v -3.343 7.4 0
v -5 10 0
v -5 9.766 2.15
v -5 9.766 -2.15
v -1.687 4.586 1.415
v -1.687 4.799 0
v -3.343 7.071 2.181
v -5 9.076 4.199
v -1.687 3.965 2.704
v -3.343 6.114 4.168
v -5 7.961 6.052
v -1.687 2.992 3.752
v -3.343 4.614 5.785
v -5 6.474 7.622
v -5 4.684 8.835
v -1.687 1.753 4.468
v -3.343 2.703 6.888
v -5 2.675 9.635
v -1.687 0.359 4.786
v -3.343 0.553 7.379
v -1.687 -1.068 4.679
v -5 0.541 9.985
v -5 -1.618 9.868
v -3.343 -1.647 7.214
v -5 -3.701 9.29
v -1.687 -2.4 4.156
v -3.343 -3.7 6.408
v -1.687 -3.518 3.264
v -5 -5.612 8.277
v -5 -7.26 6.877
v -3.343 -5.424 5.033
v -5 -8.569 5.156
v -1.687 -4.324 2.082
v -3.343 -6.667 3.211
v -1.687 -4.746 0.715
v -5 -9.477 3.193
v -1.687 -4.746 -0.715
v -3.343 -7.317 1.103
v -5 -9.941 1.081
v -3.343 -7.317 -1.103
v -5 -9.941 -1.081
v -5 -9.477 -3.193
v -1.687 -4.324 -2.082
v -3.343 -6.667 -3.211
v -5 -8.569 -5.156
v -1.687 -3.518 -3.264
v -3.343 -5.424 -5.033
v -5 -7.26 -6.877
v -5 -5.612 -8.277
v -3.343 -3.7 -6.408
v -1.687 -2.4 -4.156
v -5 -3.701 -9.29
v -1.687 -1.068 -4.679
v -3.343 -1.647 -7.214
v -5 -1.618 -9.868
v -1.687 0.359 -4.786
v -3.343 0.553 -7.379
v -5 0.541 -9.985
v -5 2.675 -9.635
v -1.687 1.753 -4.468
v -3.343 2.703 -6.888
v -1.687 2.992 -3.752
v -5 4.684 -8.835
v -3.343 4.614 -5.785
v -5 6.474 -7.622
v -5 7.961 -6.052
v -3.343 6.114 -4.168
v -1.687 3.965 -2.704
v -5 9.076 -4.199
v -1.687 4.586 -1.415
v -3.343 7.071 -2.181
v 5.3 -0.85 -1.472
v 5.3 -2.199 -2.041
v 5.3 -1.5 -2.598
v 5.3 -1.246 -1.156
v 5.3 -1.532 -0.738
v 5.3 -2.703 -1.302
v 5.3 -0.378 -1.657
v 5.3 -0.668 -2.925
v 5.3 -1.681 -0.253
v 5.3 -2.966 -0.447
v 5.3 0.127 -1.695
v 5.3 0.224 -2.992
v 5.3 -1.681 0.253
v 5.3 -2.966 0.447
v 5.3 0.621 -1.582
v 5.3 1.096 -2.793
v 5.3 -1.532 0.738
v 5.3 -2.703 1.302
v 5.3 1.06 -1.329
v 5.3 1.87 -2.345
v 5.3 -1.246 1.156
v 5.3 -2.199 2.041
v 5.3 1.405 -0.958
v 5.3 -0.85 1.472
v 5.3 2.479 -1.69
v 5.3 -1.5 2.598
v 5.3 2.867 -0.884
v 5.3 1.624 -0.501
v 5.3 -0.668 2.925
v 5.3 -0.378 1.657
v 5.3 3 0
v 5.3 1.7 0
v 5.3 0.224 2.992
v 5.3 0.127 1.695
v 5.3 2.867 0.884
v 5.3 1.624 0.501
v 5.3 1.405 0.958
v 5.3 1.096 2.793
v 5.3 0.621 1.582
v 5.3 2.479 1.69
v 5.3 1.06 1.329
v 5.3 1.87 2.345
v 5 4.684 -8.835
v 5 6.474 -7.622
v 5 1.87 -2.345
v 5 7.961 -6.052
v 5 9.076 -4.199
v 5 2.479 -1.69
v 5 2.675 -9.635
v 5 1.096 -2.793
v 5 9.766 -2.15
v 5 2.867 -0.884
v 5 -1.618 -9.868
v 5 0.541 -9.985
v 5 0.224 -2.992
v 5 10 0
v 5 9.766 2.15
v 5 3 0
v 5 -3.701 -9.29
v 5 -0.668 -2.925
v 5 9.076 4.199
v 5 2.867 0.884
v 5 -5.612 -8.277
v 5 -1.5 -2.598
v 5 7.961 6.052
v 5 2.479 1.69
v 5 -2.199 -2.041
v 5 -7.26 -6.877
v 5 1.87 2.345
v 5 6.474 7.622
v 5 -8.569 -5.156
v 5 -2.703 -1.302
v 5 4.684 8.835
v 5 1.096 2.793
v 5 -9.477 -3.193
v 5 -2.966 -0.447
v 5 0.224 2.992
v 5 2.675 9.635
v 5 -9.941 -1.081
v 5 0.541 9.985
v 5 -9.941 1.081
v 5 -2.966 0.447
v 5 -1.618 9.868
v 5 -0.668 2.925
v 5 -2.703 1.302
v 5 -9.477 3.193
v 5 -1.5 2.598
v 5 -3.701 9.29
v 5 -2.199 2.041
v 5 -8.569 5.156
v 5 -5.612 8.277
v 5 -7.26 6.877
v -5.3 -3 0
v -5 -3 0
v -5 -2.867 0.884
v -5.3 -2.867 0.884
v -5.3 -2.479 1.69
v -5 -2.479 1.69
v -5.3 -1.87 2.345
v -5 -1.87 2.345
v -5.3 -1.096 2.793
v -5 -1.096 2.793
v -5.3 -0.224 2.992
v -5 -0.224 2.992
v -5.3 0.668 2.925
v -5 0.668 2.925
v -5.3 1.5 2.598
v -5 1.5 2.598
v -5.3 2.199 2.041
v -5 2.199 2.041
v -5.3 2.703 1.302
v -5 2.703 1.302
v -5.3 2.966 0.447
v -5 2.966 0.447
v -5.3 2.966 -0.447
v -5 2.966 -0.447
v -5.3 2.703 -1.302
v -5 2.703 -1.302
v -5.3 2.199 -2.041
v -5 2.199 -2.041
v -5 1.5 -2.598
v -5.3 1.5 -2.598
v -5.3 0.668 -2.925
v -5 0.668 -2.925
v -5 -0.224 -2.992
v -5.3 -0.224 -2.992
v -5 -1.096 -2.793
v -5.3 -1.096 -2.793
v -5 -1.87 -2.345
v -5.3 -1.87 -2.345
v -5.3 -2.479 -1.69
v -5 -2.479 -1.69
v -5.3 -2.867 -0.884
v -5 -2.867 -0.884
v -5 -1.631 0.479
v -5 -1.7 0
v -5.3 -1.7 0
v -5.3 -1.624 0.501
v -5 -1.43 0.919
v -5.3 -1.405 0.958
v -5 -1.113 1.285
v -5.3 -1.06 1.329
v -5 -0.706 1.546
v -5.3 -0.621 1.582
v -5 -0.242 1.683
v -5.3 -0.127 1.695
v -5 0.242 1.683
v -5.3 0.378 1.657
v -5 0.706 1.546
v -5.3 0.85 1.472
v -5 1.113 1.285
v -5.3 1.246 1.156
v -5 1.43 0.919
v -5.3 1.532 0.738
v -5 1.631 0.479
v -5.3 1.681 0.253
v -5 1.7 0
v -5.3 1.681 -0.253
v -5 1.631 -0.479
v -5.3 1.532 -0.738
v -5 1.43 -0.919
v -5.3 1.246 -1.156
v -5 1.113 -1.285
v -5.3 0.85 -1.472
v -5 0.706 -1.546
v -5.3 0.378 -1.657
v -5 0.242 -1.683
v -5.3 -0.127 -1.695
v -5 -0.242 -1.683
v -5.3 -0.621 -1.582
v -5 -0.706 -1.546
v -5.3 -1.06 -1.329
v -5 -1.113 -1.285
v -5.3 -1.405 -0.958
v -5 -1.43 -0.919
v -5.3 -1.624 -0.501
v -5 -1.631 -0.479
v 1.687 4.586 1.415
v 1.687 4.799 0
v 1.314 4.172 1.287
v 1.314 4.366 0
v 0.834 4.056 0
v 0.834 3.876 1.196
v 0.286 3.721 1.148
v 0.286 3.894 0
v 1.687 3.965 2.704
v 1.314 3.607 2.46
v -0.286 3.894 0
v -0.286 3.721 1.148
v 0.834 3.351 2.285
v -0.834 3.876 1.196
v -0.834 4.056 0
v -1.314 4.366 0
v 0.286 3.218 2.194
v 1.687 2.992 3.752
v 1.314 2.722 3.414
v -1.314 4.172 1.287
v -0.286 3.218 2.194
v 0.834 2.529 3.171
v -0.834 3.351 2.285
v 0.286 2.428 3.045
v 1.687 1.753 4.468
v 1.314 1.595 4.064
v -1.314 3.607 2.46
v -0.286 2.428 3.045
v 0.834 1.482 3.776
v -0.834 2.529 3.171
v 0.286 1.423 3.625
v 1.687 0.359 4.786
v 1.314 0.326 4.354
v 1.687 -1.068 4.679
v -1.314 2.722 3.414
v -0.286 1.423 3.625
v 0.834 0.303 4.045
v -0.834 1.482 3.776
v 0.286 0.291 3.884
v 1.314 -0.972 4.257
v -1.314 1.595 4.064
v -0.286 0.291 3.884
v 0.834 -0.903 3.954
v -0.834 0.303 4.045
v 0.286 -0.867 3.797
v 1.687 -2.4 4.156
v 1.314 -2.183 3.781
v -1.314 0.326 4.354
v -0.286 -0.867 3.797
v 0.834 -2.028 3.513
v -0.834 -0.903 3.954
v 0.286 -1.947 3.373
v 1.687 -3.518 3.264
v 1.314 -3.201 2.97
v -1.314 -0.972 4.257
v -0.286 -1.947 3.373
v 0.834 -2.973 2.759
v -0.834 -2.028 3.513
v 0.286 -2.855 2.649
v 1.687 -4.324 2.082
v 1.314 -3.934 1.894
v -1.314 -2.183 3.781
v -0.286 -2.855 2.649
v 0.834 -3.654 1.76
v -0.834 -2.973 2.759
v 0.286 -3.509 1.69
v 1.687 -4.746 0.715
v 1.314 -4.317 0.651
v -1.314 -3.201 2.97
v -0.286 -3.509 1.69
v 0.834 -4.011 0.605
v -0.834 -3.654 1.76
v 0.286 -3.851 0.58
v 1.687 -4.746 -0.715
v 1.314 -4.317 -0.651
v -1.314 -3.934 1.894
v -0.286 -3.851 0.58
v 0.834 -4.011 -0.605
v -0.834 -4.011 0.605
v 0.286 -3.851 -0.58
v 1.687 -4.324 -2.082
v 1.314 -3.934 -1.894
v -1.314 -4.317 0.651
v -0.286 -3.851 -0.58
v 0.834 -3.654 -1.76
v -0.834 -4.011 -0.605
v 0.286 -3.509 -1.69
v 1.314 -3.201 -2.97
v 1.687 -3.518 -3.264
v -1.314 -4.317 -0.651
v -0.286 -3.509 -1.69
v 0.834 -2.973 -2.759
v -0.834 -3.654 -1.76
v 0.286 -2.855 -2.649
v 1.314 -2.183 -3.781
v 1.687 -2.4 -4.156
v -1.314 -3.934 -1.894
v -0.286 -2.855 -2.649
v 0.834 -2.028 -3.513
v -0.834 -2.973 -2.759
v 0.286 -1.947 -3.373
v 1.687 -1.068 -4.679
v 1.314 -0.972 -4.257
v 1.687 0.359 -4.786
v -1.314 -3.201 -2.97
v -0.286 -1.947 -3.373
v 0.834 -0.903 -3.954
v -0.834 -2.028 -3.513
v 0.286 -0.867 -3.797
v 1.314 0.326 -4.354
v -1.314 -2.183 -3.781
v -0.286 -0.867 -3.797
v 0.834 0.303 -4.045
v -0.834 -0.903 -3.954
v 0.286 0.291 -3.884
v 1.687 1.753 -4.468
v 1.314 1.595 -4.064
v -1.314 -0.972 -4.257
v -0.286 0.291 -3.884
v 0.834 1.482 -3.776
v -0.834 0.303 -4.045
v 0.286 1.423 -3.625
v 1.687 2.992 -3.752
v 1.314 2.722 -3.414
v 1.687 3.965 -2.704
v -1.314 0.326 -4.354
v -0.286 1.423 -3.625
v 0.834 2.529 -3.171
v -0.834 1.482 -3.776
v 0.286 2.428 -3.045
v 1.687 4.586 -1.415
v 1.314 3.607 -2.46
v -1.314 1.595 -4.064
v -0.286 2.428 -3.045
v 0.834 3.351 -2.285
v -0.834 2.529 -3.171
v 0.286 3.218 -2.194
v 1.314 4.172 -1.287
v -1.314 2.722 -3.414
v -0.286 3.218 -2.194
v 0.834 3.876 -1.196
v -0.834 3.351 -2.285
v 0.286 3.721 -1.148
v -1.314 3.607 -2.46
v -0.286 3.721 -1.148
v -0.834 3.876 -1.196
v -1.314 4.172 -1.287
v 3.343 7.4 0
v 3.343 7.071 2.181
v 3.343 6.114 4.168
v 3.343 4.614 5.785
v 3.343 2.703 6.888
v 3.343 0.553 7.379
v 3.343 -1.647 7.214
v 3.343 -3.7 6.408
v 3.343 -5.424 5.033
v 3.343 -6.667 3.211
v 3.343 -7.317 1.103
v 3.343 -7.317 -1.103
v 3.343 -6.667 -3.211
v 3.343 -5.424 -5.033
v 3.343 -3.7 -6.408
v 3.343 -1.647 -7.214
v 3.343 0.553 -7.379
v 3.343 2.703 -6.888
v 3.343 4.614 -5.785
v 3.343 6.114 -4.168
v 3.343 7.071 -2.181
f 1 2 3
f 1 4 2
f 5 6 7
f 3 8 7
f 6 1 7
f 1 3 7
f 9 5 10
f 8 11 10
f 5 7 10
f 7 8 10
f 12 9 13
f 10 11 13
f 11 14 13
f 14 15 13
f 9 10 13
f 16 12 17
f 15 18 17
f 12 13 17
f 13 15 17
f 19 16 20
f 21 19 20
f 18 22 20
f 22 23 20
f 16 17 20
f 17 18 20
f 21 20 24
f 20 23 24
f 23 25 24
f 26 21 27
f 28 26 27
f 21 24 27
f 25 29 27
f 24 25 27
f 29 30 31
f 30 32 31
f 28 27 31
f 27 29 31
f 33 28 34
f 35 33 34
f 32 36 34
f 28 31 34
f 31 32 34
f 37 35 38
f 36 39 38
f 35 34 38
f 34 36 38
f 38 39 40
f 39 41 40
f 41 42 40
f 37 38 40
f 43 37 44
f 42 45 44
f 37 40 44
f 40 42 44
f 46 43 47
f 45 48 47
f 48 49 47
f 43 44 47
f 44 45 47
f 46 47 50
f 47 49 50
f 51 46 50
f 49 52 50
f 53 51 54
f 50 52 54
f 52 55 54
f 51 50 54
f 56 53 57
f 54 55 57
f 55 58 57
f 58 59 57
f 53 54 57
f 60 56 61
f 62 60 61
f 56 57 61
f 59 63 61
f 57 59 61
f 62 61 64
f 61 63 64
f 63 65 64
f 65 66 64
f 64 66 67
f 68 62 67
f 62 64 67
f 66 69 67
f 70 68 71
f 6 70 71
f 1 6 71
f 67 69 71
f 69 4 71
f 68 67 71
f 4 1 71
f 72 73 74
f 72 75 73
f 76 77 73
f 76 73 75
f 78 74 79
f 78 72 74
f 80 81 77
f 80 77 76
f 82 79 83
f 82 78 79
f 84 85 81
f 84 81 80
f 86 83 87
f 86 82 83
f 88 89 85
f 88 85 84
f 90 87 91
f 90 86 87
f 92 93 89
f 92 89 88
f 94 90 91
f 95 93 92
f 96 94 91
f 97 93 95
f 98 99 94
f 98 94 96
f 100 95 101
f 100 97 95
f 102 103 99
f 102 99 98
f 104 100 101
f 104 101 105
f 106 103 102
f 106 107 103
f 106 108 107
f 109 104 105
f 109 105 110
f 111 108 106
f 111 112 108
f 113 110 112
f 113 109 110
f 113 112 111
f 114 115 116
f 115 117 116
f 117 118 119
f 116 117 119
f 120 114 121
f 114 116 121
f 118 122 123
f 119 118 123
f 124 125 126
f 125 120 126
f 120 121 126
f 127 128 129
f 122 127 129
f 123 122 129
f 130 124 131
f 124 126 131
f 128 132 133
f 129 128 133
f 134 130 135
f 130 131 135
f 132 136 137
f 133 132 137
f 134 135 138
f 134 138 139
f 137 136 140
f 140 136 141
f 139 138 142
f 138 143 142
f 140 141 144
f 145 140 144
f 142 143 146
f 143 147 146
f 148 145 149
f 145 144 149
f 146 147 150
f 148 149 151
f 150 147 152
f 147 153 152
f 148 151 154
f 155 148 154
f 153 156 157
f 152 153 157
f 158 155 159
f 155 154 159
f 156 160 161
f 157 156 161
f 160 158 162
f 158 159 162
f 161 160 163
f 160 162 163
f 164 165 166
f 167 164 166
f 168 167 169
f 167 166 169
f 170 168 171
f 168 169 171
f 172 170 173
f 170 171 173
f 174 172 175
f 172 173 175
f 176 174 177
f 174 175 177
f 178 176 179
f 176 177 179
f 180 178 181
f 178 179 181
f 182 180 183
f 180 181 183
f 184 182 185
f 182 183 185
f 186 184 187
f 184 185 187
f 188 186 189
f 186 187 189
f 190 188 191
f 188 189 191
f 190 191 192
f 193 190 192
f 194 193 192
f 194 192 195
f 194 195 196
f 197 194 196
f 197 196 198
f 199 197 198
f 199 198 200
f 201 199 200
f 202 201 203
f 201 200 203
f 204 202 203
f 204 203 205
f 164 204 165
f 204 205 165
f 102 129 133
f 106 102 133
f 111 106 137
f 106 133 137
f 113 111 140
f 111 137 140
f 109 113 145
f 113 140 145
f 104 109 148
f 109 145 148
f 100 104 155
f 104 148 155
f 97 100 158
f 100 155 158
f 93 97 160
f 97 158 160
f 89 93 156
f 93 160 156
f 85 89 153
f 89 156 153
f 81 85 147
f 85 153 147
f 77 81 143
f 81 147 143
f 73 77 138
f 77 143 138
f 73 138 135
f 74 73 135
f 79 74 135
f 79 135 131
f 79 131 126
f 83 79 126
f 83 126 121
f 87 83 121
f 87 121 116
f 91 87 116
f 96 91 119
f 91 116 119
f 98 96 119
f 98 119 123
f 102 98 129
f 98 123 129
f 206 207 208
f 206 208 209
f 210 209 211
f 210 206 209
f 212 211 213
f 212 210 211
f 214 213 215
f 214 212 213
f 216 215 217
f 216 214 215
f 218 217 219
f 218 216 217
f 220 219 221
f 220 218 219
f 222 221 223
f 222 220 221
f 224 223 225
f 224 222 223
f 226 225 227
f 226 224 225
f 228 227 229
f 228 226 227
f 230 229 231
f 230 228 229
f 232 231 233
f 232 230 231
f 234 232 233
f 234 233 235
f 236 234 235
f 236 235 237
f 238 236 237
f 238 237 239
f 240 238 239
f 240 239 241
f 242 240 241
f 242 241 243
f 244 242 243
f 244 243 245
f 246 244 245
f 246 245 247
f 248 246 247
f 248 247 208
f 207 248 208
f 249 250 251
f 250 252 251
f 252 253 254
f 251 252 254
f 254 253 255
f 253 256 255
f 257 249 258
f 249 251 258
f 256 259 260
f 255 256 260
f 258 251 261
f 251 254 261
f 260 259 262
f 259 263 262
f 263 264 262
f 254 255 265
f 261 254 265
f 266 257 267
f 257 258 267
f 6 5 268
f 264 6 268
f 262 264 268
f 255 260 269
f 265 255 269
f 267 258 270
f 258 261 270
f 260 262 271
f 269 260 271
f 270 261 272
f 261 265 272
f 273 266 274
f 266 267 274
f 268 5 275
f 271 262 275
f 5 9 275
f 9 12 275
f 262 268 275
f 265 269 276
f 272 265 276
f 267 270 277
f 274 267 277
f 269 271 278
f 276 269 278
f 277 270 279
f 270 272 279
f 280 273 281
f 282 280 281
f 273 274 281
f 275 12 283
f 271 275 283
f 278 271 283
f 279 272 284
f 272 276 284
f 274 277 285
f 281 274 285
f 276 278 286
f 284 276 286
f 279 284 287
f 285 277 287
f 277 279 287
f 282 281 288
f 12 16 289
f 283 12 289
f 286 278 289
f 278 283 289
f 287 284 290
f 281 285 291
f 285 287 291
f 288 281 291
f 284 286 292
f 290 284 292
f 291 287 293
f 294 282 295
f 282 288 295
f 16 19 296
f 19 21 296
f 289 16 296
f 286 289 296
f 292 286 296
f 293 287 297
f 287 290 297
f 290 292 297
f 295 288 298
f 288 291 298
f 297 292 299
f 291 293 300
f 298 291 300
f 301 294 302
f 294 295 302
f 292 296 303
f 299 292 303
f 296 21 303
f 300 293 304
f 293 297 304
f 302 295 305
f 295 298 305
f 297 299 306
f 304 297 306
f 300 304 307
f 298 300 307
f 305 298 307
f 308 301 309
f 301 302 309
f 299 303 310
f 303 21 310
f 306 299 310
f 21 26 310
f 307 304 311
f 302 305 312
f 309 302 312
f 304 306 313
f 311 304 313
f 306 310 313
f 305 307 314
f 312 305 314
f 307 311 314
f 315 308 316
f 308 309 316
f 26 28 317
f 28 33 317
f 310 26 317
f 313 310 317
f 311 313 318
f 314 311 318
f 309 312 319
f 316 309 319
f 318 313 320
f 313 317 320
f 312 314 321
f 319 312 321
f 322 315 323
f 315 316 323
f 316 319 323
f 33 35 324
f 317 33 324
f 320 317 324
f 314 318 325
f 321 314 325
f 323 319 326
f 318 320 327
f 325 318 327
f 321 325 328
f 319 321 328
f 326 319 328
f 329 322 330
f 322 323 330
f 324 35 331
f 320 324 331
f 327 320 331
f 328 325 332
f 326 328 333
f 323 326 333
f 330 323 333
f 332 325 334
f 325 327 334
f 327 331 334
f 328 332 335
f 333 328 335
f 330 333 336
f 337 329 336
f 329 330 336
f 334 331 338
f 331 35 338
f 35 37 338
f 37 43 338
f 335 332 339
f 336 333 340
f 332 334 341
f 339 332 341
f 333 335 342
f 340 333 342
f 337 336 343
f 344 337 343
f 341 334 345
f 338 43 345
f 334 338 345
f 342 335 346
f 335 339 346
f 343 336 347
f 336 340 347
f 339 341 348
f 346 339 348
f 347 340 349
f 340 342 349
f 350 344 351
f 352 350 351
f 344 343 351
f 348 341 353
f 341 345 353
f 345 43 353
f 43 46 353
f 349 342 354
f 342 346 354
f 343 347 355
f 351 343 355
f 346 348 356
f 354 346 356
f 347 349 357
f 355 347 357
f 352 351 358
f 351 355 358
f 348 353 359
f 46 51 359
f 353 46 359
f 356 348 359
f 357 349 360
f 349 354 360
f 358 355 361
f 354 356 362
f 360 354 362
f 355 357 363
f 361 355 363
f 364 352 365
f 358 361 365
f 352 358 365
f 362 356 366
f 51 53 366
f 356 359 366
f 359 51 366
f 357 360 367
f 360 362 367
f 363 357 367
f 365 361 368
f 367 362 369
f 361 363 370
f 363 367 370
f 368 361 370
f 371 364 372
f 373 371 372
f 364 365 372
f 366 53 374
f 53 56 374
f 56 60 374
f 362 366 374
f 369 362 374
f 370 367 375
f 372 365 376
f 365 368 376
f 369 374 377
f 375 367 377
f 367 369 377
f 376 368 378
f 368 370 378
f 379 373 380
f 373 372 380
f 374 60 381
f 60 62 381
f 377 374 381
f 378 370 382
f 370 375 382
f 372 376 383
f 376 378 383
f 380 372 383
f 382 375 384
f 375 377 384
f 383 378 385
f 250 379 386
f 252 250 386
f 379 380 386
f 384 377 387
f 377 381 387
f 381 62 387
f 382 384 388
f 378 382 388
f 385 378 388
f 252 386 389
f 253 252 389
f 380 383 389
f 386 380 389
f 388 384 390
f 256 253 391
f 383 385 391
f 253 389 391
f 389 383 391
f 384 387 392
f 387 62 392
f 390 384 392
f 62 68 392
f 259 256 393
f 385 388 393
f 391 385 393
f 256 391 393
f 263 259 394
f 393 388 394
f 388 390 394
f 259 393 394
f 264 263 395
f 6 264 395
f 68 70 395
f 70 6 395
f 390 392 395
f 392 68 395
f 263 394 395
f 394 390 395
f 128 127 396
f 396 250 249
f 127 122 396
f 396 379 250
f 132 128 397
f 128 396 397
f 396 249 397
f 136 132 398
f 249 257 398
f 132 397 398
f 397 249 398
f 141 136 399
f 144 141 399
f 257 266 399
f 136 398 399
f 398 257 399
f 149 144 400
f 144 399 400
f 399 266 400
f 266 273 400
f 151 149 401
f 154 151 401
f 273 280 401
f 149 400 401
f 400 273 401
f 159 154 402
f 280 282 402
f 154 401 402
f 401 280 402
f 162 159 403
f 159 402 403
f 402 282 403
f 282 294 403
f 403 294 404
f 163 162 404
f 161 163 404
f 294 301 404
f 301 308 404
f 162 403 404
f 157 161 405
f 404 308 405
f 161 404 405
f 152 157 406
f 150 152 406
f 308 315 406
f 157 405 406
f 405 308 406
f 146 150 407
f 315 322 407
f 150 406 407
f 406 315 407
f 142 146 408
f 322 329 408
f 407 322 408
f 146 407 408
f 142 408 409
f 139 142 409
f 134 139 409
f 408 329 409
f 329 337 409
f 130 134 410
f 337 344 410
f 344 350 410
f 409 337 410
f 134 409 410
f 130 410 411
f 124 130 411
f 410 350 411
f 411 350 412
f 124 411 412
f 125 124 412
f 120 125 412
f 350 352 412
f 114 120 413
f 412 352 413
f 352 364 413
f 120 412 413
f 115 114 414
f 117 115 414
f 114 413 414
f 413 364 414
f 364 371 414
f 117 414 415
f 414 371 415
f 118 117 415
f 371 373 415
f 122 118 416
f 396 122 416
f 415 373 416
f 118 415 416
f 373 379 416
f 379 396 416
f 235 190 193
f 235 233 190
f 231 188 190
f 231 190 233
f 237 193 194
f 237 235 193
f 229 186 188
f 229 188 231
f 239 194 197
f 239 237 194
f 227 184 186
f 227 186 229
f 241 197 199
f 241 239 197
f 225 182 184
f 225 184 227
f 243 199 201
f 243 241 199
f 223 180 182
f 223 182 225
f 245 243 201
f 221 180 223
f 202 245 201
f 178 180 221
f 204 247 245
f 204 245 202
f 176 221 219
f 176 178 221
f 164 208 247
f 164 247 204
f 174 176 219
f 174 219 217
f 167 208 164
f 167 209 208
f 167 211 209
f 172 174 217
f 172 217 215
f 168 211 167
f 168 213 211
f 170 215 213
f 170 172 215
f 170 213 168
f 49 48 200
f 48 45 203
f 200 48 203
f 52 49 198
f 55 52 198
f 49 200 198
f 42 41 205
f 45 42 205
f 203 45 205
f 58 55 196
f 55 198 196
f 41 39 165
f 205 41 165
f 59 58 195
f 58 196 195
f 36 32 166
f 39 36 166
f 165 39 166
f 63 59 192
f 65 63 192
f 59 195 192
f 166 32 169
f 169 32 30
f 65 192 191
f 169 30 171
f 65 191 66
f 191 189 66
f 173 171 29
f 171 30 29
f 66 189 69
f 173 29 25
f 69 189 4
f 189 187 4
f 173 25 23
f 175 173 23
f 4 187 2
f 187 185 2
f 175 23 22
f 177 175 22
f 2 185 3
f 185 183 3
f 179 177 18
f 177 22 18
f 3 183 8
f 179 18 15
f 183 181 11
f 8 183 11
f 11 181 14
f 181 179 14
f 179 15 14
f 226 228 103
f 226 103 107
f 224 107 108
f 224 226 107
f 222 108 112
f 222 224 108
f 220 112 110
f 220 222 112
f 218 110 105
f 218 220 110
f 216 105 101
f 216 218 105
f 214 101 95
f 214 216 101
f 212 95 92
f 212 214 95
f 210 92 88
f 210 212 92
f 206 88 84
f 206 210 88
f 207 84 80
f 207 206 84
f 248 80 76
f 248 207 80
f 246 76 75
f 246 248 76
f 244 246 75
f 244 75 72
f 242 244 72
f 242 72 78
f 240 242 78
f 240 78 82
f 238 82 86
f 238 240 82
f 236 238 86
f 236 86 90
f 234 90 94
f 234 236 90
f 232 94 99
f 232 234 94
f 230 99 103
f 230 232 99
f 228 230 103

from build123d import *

# Parameters (mm, degrees)
F3_ANGLE = 90
F4_R     = 3
F4_R_2   = 1.7
F5_DEPTH = 0.3
F6_R     = 3
F6_R_2   = 1.7
F7_DEPTH = 0.3


with BuildPart() as f2:
    # F0 (on Front) → F2 (revolve)
    with BuildSketch(Plane.XZ):
        with BuildLine():
            Line((-5, 10), (-5, 1.7))
            Line((-5, 1.7), (5, 1.7))
            Line((5, 1.7), (5, 10))
            Line((5, 10), (1.6867828916, 4.7992908911))
            ThreePointArc((1.6867828916, 4.7992908911), (0, 3.8738901078), (-1.6867828916, 4.7992908911))
            Line((-1.6867828916, 4.7992908911), (-5, 10))
        make_face()
    revolve(axis=Axis((0, 0, 0), (1, 0, 0)))


with BuildPart() as f2_1:
    # F3: moved
    add(f2.part.rotate(Axis((-13.5274957865, 0, 0), (-1, 0, 0)), F3_ANGLE))

    # F4 (on face) → F5 (join)
    with BuildSketch(Plane.YZ.offset(5)):
        Circle(F4_R)
        Circle(F4_R_2, mode=Mode.SUBTRACT)
    extrude(amount=F5_DEPTH)

    # F6 (on face) → F7 (join)
    with BuildSketch(Plane(origin=(-5, 0, 0), x_dir=(0, -1, 0), z_dir=(-1, 0, 0))):
        Circle(F6_R)
        Circle(F6_R_2, mode=Mode.SUBTRACT)
    extrude(amount=F7_DEPTH)


solid = f2_1.part
